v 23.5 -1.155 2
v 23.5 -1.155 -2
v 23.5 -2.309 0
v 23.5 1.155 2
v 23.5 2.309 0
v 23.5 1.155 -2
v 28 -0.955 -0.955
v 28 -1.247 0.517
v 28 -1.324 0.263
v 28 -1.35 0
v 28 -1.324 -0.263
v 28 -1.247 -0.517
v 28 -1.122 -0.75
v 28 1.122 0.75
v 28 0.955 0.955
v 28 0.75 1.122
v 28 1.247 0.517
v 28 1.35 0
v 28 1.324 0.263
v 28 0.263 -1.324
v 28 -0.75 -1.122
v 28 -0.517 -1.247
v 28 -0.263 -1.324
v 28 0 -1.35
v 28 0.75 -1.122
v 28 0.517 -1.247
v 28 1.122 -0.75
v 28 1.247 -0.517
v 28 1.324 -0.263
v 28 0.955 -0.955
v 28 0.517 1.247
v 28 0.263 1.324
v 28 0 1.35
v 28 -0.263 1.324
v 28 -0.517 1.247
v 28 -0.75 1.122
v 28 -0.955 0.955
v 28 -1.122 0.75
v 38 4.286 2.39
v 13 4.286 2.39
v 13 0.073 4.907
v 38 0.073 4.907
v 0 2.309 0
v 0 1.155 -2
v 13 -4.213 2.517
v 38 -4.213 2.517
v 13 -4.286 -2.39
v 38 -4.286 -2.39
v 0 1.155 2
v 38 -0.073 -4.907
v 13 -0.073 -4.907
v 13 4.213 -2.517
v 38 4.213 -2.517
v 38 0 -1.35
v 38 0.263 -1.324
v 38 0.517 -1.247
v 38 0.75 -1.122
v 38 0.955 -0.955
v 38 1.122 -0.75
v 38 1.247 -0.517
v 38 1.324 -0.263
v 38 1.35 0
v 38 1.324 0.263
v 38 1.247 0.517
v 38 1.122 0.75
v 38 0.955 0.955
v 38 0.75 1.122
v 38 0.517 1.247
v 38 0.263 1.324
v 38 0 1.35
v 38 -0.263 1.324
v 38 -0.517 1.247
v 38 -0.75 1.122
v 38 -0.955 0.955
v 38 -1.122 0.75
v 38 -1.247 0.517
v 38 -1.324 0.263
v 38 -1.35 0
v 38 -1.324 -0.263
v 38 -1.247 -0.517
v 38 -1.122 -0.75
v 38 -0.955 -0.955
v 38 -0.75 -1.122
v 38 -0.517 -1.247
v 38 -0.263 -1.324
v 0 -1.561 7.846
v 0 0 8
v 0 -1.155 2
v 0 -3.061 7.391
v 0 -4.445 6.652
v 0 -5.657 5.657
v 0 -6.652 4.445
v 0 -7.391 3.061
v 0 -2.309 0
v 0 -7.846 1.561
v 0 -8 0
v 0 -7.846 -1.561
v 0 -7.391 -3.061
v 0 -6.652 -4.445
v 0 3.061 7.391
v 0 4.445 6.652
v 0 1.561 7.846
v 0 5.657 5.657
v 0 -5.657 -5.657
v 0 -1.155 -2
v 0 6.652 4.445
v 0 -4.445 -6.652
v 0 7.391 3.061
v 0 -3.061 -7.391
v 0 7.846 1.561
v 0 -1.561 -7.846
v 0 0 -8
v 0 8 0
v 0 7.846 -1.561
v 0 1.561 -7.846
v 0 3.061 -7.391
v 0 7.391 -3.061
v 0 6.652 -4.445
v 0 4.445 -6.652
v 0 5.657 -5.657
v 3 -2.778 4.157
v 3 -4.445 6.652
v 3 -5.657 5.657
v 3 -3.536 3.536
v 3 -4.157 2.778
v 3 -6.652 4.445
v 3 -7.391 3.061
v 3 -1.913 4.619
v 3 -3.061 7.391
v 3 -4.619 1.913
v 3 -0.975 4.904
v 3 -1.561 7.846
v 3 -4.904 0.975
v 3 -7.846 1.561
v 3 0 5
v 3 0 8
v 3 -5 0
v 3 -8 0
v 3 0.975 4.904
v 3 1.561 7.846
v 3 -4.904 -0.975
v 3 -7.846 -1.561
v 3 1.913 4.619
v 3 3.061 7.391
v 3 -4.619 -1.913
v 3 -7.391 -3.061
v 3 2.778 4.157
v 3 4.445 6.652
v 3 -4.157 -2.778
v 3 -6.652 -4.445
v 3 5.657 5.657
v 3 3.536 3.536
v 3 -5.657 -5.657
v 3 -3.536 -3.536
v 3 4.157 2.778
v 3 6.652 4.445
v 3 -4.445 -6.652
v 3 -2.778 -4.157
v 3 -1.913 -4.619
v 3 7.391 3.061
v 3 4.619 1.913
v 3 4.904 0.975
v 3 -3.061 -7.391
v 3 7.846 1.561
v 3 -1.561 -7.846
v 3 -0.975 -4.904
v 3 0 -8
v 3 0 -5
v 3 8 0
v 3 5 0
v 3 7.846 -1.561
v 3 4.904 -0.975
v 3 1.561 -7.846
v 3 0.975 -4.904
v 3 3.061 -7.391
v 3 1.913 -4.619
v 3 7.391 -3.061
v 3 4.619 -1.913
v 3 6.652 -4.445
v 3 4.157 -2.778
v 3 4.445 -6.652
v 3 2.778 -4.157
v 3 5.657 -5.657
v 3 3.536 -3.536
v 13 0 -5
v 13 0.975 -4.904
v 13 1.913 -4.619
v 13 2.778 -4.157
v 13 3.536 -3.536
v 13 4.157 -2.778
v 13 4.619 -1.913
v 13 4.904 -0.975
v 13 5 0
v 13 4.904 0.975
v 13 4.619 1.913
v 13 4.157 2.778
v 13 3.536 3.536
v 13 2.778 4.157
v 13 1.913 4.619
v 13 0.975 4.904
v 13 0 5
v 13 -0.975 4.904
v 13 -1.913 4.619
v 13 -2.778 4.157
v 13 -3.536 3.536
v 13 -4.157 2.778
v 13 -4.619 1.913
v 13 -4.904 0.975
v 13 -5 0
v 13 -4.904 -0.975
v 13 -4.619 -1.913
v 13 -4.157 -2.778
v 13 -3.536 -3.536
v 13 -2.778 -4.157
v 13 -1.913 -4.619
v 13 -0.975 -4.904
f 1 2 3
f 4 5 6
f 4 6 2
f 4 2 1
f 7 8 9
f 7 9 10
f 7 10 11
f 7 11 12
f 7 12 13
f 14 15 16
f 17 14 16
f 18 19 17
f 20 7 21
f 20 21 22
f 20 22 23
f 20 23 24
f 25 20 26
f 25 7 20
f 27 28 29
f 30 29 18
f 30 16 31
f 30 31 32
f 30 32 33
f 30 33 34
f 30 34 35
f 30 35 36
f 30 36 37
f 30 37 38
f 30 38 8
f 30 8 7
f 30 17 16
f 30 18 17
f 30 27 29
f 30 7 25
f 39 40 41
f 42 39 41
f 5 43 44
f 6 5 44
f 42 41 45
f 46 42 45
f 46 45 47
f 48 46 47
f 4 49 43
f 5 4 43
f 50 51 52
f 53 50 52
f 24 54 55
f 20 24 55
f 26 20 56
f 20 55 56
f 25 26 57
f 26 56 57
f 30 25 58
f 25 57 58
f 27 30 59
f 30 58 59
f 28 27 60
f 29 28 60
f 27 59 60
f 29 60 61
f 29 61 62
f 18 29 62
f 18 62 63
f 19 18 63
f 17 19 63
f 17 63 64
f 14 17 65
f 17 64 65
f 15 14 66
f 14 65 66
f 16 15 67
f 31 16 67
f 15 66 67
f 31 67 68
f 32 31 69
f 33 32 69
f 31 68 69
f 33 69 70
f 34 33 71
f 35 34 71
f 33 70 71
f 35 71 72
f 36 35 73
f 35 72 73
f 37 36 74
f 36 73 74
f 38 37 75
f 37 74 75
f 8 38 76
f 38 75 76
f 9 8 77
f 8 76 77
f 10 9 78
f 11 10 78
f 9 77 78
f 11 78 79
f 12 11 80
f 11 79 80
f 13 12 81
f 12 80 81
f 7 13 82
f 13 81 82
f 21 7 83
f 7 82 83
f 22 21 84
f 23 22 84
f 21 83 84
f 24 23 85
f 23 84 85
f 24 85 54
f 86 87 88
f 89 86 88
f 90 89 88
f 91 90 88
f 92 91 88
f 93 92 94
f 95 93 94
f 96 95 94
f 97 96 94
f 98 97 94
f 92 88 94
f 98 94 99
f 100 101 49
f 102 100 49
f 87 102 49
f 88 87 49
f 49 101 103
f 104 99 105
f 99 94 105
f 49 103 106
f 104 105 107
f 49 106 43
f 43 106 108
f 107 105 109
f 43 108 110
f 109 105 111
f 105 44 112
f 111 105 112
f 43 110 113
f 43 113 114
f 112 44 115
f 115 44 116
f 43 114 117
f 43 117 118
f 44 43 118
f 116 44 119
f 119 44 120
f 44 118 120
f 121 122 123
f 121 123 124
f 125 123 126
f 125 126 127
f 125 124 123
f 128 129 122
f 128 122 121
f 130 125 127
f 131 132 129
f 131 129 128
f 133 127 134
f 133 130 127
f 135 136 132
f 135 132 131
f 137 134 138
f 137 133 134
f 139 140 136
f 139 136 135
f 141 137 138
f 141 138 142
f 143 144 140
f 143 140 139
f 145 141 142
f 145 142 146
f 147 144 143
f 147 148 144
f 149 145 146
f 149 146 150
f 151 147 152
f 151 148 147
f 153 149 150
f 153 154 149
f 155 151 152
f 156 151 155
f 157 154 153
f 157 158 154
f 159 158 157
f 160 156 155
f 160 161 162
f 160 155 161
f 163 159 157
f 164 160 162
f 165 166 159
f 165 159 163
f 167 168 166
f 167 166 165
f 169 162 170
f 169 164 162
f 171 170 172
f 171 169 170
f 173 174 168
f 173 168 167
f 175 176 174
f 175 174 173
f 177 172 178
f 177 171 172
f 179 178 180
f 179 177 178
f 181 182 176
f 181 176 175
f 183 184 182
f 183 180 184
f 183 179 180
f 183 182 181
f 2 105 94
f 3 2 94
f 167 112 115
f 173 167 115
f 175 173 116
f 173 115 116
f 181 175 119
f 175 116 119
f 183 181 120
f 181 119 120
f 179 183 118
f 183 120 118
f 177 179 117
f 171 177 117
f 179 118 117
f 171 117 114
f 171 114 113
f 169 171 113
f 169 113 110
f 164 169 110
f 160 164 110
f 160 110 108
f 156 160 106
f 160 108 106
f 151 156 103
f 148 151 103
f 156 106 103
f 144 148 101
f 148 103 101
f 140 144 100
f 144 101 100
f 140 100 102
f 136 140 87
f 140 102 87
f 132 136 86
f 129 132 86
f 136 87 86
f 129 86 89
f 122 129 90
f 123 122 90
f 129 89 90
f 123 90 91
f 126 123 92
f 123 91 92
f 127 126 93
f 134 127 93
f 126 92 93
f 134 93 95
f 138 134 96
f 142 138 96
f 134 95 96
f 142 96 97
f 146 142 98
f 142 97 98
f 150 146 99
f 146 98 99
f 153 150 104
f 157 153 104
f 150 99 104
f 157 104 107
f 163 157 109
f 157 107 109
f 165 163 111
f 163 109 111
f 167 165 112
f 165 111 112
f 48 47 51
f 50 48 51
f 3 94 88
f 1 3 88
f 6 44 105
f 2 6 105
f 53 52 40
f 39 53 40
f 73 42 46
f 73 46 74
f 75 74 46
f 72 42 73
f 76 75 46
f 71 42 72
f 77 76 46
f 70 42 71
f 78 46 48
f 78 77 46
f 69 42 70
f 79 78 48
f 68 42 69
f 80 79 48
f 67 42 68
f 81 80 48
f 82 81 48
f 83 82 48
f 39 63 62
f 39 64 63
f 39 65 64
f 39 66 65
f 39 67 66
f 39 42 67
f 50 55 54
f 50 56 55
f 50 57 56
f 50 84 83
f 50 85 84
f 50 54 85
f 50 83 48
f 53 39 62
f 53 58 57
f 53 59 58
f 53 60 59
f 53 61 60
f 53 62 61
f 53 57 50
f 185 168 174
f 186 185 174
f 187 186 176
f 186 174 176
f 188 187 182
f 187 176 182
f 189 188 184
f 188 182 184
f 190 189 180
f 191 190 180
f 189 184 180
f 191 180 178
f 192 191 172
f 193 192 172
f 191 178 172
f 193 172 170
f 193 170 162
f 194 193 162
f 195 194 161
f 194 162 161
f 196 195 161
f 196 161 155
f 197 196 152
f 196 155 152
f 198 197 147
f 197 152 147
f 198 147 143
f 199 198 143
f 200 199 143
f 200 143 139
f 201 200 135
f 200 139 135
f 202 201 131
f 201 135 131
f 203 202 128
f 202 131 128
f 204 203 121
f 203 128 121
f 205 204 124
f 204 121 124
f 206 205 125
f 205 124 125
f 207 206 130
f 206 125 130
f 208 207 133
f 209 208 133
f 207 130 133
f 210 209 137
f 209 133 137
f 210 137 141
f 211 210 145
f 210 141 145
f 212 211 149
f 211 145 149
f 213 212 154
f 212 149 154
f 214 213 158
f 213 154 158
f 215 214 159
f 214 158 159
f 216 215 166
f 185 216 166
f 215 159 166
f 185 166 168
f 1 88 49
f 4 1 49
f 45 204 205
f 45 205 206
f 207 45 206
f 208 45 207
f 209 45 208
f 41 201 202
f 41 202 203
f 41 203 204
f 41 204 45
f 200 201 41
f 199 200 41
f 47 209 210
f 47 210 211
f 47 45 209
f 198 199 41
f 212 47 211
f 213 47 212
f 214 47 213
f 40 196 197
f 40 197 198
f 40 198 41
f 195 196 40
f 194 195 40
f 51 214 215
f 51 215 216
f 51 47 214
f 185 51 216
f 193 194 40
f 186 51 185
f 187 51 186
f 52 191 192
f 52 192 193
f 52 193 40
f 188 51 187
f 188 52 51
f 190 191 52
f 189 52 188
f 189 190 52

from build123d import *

# Parameters (mm, degrees)
SKETCH2_R           = 8
BOSS_EXTRUDE1_DEPTH = 3
SKETCH3_R           = 5
BOSS_EXTRUDE2_DEPTH = 10
BOSS_EXTRUDE3_DEPTH = 25
SKETCH8_R           = 1.35
CUT_EXTRUDE3_DEPTH  = 10
CUT_EXTRUDE5_DEPTH  = 23.5


with BuildPart() as part:
    # Sketch2 → Boss-Extrude1 (new body)
    with BuildSketch(Plane(origin=(0, 0, 0), x_dir=(0, 0, -1), z_dir=(1, 0, 0))):
        Circle(SKETCH2_R)
    extrude(amount=BOSS_EXTRUDE1_DEPTH)

    # Sketch3 → Boss-Extrude2 (add)
    with BuildSketch(Plane(origin=(3, 0, 0), x_dir=(0, 0, -1), z_dir=(1, 0, 0))):
        Circle(SKETCH3_R)
    extrude(amount=BOSS_EXTRUDE2_DEPTH)

    # Sketch6 → Boss-Extrude3 (add)
    with BuildSketch(Plane(origin=(13, 0, 0), x_dir=(0, 0, -1), z_dir=(1, 0, 0))):
        Polygon((2.389986953, -4.286174949), (4.906929868, -0.073298058), (2.516942915, 4.212876891), (-2.389986953, 4.286174949), (-4.906929868, 0.073298058), (-2.516942915, -4.212876891), align=None)
    extrude(amount=BOSS_EXTRUDE3_DEPTH)

    # Sketch8 → Cut-Extrude3 (cut)
    with BuildSketch(Plane(origin=(38, 0, 0), x_dir=(0, 0, -1), z_dir=(1, 0, 0))):
        Circle(SKETCH8_R)
    extrude(amount=-CUT_EXTRUDE3_DEPTH, mode=Mode.SUBTRACT)

    # Sketch5 → Cut-Extrude5 (cut)
    with BuildSketch(Plane.ZY):
        Polygon((0, -2.309401077), (2, -1.154700538), (2, 1.154700538), (0, 2.309401077), (-2, 1.154700538), (-2, -1.154700538), align=None)
    extrude(amount=-CUT_EXTRUDE5_DEPTH, mode=Mode.SUBTRACT)


solid = part.part
